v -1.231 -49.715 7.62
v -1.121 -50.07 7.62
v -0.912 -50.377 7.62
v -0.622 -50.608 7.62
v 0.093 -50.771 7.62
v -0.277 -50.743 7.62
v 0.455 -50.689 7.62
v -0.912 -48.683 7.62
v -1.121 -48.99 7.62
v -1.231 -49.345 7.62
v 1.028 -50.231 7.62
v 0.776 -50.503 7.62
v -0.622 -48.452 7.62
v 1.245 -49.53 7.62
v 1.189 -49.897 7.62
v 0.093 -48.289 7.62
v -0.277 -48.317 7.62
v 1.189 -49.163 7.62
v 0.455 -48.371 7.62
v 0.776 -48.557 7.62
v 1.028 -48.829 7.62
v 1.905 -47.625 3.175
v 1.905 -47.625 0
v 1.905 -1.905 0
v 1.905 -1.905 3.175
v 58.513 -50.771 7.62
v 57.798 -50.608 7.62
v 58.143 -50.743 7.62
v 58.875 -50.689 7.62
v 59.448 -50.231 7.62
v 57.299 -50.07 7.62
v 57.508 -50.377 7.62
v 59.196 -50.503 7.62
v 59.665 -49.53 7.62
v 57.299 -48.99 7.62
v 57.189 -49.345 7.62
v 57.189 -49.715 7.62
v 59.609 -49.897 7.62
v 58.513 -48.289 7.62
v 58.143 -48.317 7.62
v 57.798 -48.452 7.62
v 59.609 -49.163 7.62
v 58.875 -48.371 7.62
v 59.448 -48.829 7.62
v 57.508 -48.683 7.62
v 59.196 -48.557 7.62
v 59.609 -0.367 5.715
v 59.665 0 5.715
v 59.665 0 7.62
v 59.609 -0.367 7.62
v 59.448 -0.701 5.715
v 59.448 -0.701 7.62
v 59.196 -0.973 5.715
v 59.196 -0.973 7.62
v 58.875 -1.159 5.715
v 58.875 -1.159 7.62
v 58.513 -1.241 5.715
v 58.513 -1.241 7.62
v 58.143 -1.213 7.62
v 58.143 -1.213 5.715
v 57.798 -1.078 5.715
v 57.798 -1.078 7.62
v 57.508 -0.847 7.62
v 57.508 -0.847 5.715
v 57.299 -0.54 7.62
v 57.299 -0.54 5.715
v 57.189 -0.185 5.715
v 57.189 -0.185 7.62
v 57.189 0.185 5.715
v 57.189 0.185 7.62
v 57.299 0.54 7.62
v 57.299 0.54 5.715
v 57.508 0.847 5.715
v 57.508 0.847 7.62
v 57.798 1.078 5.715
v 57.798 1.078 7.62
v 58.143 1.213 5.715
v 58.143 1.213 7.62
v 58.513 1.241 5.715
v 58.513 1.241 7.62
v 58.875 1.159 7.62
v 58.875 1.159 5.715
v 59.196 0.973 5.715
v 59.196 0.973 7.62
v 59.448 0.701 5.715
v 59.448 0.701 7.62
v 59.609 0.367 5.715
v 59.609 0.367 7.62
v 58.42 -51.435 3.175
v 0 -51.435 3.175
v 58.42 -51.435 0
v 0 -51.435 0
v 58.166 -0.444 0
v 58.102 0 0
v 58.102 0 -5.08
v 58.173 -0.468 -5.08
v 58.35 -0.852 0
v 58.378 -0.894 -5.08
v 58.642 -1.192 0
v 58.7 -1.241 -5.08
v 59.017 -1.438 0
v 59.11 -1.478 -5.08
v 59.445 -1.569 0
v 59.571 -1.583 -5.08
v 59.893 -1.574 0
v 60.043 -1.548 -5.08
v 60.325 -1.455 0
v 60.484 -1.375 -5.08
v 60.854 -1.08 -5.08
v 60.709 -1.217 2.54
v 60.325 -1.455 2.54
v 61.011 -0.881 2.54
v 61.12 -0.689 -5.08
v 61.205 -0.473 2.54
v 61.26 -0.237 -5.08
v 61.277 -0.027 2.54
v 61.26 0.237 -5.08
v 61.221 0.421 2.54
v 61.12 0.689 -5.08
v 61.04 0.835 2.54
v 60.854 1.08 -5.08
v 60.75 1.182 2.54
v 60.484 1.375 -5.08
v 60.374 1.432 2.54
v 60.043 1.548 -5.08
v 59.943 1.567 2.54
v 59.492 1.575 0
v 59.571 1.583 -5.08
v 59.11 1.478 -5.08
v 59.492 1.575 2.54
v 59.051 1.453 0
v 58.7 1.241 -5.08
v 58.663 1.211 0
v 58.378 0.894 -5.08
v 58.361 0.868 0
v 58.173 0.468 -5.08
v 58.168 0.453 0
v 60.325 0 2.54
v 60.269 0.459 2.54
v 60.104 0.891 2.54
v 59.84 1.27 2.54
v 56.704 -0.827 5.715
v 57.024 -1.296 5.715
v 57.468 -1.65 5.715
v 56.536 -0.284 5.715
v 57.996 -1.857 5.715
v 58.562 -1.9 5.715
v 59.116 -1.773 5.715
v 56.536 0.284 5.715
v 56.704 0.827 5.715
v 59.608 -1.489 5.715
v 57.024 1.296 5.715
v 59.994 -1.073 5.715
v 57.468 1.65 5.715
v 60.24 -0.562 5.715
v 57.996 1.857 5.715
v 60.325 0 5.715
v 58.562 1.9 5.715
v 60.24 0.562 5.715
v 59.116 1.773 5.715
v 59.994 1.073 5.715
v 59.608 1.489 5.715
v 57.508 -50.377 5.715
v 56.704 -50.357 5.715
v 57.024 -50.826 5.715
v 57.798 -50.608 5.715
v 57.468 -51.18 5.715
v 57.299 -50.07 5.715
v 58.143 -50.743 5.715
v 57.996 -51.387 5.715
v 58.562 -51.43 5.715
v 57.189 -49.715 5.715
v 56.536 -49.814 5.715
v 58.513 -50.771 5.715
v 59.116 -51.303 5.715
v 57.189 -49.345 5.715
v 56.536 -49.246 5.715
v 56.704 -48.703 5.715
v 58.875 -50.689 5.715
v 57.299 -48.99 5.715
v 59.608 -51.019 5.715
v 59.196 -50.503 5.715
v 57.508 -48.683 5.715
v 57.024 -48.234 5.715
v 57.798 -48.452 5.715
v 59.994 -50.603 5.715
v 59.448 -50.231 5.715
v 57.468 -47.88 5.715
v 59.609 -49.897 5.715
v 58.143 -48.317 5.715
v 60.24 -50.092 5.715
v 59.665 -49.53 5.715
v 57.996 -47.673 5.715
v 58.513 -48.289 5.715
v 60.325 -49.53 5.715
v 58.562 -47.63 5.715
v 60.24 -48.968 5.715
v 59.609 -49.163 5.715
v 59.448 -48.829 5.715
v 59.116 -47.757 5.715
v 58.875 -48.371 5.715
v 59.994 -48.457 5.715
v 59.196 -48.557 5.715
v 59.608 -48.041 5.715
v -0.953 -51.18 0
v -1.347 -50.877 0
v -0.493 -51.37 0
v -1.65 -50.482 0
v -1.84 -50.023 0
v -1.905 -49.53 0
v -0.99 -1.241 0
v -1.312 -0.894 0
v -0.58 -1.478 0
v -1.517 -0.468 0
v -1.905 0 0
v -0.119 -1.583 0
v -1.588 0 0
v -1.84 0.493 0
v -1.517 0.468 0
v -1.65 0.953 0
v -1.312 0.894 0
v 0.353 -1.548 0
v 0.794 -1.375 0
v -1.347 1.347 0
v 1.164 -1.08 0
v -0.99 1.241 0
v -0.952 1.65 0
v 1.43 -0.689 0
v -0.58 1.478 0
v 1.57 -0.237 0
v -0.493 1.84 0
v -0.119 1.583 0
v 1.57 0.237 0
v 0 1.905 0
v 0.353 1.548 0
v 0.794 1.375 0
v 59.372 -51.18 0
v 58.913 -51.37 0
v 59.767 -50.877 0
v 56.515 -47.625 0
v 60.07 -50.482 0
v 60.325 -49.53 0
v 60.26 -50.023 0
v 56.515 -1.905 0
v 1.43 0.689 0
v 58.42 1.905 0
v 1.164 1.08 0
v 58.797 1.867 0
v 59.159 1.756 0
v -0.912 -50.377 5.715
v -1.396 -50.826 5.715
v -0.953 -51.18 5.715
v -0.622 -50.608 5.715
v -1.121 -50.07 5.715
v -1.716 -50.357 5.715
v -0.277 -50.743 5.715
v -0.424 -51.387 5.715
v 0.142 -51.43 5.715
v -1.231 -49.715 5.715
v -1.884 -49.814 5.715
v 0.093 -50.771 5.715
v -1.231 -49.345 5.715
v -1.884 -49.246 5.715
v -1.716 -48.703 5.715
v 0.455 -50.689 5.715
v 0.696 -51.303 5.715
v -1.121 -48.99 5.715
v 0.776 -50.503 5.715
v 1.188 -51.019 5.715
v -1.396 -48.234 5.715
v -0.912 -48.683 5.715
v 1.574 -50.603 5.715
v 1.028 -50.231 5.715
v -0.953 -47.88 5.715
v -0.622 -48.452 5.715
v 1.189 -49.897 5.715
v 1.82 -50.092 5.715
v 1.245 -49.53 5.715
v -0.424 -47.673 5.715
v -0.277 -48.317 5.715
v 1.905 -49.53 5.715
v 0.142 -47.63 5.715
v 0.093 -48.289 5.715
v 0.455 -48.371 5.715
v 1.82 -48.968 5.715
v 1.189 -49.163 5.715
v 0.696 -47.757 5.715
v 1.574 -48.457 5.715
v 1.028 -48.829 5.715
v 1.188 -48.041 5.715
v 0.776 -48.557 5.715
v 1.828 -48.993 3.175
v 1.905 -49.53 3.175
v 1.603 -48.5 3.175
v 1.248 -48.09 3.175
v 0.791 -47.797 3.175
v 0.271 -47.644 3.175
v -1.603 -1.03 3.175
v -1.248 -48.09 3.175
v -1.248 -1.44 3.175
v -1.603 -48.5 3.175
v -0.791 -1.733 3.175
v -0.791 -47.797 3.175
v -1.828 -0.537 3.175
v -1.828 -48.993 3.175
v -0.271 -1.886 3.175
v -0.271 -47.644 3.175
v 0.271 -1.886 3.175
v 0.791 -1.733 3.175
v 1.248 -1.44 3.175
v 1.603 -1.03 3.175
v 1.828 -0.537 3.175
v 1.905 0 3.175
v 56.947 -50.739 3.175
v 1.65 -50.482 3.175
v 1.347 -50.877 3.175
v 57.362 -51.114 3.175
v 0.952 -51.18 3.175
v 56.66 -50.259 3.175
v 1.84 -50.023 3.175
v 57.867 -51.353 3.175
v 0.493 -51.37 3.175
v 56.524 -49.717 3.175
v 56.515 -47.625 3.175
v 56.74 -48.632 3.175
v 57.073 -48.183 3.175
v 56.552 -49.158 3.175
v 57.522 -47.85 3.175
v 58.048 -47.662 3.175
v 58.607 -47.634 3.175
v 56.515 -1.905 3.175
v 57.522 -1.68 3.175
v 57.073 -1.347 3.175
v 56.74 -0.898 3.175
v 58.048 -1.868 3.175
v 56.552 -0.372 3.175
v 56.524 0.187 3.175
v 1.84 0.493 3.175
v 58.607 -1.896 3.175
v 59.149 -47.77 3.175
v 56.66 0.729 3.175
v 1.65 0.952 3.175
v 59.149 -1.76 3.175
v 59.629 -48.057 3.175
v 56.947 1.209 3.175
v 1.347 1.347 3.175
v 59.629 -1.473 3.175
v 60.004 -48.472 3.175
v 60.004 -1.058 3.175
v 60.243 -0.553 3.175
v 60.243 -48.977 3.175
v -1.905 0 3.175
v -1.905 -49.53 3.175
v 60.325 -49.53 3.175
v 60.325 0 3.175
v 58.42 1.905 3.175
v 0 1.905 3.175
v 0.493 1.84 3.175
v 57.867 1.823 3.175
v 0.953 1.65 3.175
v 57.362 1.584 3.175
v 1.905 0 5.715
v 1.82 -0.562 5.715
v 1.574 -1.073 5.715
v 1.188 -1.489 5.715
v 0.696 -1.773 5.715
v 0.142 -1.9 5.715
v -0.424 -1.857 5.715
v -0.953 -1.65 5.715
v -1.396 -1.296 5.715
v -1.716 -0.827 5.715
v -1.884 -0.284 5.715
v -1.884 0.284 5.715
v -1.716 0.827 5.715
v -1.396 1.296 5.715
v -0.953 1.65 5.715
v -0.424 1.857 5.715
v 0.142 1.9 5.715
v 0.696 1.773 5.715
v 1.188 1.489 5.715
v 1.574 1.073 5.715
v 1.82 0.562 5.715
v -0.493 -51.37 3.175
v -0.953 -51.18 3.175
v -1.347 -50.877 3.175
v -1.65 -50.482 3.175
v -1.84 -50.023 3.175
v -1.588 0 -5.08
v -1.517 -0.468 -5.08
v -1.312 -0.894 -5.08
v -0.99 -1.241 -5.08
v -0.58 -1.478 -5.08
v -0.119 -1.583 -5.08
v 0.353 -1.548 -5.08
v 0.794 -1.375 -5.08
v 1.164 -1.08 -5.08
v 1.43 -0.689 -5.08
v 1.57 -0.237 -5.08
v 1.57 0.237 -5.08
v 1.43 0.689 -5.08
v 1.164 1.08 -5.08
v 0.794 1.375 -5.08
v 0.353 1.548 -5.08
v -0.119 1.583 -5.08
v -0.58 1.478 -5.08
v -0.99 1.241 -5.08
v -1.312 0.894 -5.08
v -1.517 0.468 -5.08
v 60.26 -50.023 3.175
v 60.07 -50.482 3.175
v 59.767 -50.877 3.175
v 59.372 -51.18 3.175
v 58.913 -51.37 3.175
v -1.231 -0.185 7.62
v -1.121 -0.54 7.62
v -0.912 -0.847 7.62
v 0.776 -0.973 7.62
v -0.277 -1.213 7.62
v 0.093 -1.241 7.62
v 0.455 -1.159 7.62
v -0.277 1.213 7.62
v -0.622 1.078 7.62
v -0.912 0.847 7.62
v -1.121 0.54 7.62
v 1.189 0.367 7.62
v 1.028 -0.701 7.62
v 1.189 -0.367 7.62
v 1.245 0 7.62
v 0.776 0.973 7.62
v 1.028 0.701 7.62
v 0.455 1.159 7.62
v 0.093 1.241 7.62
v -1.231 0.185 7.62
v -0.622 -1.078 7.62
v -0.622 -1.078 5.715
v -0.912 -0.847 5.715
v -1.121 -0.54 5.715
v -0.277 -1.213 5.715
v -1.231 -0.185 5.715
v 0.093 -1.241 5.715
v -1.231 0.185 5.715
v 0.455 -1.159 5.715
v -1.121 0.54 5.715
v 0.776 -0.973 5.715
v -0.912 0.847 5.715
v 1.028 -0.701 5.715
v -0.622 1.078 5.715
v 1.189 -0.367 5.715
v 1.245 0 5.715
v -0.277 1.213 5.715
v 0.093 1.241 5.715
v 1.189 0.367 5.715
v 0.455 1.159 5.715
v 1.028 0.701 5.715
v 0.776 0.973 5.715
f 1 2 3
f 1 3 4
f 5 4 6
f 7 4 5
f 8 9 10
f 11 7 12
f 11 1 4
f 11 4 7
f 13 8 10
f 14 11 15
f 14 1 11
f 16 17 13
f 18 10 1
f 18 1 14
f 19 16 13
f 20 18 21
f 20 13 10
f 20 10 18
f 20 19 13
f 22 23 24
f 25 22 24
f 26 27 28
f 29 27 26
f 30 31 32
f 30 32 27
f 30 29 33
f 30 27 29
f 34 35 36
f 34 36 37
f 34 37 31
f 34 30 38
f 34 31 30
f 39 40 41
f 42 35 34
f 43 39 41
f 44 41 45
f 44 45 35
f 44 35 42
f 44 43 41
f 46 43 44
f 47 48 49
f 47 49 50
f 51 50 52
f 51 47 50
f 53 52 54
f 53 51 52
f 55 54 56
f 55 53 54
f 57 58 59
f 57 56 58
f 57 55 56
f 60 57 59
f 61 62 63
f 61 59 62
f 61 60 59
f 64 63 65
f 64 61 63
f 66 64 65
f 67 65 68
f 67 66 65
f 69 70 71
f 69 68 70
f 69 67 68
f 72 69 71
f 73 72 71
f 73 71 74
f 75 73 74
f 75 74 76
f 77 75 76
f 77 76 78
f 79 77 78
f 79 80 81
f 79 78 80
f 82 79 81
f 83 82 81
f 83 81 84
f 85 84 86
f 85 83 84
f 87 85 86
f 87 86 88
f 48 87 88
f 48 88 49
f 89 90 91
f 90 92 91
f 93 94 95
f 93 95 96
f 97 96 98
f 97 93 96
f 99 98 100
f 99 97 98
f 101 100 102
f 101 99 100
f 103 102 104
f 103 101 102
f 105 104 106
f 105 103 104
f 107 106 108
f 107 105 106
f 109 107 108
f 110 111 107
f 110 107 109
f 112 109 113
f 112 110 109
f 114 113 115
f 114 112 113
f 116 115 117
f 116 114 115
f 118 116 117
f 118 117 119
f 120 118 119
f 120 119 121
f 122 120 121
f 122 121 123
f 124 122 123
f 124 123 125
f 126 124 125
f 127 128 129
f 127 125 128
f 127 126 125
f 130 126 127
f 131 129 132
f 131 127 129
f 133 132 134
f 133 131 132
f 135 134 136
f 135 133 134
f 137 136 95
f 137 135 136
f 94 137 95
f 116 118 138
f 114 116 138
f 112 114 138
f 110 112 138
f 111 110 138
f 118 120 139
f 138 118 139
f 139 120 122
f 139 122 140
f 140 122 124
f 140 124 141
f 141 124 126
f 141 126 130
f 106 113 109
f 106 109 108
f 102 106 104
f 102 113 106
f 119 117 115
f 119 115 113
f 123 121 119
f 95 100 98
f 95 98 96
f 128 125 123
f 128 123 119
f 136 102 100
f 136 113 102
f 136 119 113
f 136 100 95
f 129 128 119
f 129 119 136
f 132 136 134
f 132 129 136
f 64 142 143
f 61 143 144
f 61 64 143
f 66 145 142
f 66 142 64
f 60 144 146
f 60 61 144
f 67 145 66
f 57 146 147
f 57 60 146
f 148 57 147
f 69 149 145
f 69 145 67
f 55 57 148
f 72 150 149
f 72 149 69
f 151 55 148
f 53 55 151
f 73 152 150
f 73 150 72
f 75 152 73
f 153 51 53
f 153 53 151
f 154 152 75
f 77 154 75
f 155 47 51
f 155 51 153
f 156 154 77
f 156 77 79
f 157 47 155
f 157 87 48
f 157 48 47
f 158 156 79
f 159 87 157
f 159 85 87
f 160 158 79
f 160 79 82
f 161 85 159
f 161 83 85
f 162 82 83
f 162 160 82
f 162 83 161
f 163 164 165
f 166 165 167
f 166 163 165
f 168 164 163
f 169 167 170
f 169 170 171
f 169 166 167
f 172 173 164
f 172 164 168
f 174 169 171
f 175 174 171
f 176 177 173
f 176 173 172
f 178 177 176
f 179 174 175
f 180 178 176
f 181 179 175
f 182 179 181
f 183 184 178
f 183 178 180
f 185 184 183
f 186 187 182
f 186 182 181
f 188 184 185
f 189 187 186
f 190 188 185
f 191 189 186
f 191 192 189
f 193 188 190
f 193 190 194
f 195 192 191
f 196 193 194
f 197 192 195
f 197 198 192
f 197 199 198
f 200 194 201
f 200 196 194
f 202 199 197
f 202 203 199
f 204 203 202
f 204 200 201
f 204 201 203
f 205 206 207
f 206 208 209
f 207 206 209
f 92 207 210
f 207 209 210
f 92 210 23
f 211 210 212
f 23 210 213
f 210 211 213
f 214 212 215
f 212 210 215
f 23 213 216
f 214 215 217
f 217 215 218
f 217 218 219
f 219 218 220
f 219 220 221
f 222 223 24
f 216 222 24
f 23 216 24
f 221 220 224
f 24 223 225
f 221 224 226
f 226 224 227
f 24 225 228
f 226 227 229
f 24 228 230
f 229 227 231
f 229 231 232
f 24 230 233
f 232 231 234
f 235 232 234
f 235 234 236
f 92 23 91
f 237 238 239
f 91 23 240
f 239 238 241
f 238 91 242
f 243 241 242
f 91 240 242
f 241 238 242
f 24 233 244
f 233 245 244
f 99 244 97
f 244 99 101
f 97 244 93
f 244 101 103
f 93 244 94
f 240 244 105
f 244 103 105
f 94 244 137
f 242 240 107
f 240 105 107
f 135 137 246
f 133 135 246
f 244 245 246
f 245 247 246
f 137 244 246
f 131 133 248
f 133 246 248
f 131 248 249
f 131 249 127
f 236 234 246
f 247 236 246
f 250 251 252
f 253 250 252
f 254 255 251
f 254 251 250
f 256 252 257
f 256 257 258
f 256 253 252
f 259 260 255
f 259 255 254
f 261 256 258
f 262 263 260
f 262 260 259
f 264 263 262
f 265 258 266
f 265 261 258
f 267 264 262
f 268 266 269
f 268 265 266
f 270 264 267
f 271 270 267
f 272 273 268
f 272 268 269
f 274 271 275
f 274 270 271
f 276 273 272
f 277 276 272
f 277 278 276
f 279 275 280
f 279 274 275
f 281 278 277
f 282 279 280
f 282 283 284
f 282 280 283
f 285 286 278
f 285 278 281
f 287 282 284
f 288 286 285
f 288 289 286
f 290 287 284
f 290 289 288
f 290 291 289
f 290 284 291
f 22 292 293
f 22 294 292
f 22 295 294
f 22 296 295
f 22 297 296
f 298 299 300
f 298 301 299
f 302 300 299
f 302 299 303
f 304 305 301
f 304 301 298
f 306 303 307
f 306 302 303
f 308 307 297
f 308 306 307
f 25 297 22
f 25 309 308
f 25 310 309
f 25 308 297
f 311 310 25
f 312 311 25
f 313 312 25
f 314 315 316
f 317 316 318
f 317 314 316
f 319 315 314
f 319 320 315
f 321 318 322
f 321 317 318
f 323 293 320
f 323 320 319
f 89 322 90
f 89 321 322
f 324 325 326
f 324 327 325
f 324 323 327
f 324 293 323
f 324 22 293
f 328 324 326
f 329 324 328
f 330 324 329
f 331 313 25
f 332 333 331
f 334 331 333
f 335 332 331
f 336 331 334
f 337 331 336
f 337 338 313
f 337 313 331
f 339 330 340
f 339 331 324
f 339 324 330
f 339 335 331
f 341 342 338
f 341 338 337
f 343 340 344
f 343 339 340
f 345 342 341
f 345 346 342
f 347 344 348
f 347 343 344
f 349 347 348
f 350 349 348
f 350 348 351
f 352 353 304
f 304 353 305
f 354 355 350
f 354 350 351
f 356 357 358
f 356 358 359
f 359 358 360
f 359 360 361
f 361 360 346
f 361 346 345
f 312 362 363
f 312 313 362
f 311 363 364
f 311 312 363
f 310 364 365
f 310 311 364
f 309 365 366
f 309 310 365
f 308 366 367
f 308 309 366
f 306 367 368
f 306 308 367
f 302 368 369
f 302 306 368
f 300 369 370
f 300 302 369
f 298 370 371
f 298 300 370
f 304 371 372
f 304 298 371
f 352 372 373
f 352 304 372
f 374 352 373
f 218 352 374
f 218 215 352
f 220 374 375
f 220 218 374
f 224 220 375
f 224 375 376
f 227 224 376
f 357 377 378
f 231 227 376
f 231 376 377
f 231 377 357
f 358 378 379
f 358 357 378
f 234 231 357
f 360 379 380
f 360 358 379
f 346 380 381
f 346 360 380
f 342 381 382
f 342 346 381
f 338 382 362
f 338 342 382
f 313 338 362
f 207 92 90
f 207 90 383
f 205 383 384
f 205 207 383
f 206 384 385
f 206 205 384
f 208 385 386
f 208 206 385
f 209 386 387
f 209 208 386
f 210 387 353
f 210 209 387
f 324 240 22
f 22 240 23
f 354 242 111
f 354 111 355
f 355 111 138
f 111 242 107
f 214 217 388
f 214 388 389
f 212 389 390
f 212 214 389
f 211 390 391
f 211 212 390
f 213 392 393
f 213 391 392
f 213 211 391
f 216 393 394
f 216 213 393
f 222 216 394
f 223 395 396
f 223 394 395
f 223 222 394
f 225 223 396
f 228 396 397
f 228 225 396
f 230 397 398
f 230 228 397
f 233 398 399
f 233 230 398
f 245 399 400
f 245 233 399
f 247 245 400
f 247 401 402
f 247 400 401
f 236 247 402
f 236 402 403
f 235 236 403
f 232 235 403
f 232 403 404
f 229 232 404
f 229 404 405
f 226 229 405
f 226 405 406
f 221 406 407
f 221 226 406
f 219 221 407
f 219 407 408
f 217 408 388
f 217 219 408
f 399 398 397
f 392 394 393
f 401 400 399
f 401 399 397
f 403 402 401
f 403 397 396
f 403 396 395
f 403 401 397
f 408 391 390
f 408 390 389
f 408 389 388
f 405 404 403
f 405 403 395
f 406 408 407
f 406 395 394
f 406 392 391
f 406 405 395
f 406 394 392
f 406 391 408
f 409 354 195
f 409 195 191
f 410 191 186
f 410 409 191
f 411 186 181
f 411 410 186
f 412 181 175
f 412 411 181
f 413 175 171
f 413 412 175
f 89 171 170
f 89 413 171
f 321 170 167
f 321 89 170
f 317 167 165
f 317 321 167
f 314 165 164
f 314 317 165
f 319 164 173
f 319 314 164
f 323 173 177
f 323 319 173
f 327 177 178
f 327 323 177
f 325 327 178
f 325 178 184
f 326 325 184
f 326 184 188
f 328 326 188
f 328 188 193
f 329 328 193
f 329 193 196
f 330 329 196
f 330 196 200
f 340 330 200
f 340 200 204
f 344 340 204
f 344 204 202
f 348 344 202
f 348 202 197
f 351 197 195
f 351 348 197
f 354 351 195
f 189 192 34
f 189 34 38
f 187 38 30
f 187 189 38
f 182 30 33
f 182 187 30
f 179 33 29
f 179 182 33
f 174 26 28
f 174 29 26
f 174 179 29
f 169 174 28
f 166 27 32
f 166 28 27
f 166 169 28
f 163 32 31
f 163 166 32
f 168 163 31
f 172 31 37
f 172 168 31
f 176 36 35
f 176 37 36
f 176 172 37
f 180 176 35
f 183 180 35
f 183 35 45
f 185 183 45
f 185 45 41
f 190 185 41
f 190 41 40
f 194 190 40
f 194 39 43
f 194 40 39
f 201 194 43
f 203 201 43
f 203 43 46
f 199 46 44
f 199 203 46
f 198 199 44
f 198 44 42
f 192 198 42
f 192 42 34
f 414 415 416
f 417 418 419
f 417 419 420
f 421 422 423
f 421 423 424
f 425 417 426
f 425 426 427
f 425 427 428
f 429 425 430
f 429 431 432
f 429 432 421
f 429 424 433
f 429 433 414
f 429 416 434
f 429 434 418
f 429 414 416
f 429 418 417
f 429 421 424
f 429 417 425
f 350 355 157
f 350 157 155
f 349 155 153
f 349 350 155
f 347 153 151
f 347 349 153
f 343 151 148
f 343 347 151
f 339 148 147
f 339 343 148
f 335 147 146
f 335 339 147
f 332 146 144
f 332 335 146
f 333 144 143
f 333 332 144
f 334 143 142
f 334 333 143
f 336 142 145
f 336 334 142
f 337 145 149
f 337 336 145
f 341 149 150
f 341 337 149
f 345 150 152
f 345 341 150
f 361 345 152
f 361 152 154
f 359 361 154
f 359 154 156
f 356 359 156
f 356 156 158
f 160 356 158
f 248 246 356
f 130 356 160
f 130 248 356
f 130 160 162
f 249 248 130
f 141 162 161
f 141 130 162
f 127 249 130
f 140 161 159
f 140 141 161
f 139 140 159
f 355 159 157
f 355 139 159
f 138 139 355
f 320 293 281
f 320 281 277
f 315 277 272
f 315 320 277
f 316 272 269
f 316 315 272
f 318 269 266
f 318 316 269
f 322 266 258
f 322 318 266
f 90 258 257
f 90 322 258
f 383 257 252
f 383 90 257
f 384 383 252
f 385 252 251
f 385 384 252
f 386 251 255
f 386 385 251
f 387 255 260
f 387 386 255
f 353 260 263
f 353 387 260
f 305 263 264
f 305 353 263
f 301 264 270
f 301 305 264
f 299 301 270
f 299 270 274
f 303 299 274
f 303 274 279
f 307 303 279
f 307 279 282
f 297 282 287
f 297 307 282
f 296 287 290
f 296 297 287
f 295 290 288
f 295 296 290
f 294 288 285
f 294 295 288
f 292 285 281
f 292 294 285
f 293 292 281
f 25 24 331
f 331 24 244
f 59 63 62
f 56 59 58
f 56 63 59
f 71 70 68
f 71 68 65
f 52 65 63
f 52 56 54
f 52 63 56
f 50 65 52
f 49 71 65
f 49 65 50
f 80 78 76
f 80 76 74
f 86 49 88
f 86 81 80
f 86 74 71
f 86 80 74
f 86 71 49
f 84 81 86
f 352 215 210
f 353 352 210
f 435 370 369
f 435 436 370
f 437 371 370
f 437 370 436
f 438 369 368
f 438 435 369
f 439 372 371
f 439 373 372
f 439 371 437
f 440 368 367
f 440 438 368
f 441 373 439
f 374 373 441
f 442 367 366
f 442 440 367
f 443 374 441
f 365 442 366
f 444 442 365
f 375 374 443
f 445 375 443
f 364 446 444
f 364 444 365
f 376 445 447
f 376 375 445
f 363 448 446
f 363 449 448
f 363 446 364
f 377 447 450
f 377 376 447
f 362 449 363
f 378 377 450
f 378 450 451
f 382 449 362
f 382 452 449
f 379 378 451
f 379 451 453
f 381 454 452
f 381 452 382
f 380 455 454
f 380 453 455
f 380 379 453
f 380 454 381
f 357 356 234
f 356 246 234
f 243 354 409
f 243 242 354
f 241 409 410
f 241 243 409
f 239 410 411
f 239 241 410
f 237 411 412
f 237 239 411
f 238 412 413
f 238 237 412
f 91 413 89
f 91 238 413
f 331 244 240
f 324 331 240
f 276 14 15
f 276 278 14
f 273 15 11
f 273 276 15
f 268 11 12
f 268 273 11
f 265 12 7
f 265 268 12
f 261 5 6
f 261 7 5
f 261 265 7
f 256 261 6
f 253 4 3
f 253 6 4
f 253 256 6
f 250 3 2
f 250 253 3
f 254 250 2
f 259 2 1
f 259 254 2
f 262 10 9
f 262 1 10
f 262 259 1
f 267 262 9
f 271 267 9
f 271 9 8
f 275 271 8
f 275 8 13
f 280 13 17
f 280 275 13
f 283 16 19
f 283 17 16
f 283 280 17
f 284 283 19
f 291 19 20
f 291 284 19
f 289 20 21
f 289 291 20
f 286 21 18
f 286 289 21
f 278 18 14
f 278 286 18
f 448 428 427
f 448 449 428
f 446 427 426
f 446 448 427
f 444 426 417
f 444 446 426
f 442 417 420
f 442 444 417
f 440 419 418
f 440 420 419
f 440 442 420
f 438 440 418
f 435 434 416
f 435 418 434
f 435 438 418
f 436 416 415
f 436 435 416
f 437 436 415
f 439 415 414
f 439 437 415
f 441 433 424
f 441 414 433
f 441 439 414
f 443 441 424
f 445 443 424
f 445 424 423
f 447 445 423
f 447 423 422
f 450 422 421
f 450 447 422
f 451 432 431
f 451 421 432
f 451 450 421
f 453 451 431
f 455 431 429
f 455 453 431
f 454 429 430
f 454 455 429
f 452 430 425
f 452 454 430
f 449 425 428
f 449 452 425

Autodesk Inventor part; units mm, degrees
ref_plane "YZ Plane" through (0, 0, 0) normal (1, 0, 0) x (0, 1, 0)
ref_plane "XZ Plane" through (0, 0, 0) normal (0, 1, 0) x (-1, 0, 0)
ref_plane "XY Plane" through (0, 0, 0) normal (0, 0, 1) x (1, 0, 0)
sketch "Sketch1" plane through (0, 0, 0) normal (0, 0, 1) x (1, 0, 0)
  arc A0 (0, 1.905) -> (-1.905, 0) centre (0, 0) ccw
  arc A1 (60.325, 0) -> (58.42, 1.905) centre (58.42, 0) ccw
  arc A2 (-1.905, -49.53) -> (0, -51.435) centre (0, -49.53) ccw
  arc A3 (58.42, -51.435) -> (60.325, -49.53) centre (58.42, -49.53) ccw
  line L0 (0, -51.435) -> (58.42, -51.435)
  line L1 (60.325, -49.53) -> (60.325, 0)
  line L2 (58.42, 1.905) -> (0, 1.905)
  line L3 (-1.905, 0) -> (-1.905, -49.53)
  line L4 (1.905, -47.625) -> (1.905, -1.905)
  line L5 (1.905, -1.905) -> (56.515, -1.905)
  line L6 (56.515, -1.905) -> (56.515, -47.625)
  line L7 (56.515, -47.625) -> (1.905, -47.625)
  dimension "d0" = 58.42
  dimension "d1" = 3.81
  dimension "d2" = 3.81
  dimension "d3" = 49.53
  dimension "d4" = 3.81
  dimension "d5" = 3.81
extrude "Extrusion1" add sketch "Sketch1" along normal blind 3.175
sketch "Sketch2" plane through (0, 0, 3.175) normal (0, 0, 1) x (1, 0, 0)
  circle A0 centre (0, 0) radius 1.2446
  circle A1 centre (58.42, 0) radius 1.2446
  line L0 (60.325, -49.53) -> (60.325, 0) projected
  circle A2 centre (58.42, -49.53) radius 1.2446
  circle A3 centre (0, -49.53) radius 1.2446
  arc A4 (0, 1.905) -> (-1.905, 0) centre (0, 0) ccw projected
  circle A5 centre (0, 0) radius 1.905
  circle A6 centre (0, -49.53) radius 1.905
  circle A7 centre (58.42, -49.53) radius 1.905
  circle A8 centre (58.42, 0) radius 1.905
  dimension "d8" = 2.4892
  dimension "d9" = 2.4892
  dimension "d10" = 1.905
  dimension "d11" = 2.4892
extrude "Extrusion2" add sketch "Sketch2" along normal blind 4.445 contours A0 | A1 | A2 | A3
extrude "Extrusion3" add sketch "Sketch2" along normal blind 2.54
sketch "Sketch3" plane through (0, 0, 0) normal (0, 0, -1) x (-1, 0, 0)
  line L0 (0, 1.905) -> (-58.42, 1.905) projected
  circle A0 centre (0, -49.53) radius 1.2446 projected
  circle A1 centre (-59.69, -49.53) radius 1.5875
  circle A2 centre (0, 0) radius 1.5875
  circle A3 centre (-59.69, 0) radius 1.5875
  circle A4 centre (0, -49.53) radius 1.5875
  point P0 (1.905, 0)
  point P1 (1.905, -49.53)
  dimension "d22" = 3.175
  dimension "d24" = 59.69
  dimension "d25" = 3.175
  dimension "d26" = 3.175
  dimension "d27" = 3.175
  dimension "d36" = 0
extrude "Extrusion8" add sketch "Sketch3" against normal blind 2.54 contours A3
extrude "Extrusion9" add sketch "Sketch3" along normal blind 5.08 contours A2 | A3
properties part number "PiMount" material "ABS Plastic"
